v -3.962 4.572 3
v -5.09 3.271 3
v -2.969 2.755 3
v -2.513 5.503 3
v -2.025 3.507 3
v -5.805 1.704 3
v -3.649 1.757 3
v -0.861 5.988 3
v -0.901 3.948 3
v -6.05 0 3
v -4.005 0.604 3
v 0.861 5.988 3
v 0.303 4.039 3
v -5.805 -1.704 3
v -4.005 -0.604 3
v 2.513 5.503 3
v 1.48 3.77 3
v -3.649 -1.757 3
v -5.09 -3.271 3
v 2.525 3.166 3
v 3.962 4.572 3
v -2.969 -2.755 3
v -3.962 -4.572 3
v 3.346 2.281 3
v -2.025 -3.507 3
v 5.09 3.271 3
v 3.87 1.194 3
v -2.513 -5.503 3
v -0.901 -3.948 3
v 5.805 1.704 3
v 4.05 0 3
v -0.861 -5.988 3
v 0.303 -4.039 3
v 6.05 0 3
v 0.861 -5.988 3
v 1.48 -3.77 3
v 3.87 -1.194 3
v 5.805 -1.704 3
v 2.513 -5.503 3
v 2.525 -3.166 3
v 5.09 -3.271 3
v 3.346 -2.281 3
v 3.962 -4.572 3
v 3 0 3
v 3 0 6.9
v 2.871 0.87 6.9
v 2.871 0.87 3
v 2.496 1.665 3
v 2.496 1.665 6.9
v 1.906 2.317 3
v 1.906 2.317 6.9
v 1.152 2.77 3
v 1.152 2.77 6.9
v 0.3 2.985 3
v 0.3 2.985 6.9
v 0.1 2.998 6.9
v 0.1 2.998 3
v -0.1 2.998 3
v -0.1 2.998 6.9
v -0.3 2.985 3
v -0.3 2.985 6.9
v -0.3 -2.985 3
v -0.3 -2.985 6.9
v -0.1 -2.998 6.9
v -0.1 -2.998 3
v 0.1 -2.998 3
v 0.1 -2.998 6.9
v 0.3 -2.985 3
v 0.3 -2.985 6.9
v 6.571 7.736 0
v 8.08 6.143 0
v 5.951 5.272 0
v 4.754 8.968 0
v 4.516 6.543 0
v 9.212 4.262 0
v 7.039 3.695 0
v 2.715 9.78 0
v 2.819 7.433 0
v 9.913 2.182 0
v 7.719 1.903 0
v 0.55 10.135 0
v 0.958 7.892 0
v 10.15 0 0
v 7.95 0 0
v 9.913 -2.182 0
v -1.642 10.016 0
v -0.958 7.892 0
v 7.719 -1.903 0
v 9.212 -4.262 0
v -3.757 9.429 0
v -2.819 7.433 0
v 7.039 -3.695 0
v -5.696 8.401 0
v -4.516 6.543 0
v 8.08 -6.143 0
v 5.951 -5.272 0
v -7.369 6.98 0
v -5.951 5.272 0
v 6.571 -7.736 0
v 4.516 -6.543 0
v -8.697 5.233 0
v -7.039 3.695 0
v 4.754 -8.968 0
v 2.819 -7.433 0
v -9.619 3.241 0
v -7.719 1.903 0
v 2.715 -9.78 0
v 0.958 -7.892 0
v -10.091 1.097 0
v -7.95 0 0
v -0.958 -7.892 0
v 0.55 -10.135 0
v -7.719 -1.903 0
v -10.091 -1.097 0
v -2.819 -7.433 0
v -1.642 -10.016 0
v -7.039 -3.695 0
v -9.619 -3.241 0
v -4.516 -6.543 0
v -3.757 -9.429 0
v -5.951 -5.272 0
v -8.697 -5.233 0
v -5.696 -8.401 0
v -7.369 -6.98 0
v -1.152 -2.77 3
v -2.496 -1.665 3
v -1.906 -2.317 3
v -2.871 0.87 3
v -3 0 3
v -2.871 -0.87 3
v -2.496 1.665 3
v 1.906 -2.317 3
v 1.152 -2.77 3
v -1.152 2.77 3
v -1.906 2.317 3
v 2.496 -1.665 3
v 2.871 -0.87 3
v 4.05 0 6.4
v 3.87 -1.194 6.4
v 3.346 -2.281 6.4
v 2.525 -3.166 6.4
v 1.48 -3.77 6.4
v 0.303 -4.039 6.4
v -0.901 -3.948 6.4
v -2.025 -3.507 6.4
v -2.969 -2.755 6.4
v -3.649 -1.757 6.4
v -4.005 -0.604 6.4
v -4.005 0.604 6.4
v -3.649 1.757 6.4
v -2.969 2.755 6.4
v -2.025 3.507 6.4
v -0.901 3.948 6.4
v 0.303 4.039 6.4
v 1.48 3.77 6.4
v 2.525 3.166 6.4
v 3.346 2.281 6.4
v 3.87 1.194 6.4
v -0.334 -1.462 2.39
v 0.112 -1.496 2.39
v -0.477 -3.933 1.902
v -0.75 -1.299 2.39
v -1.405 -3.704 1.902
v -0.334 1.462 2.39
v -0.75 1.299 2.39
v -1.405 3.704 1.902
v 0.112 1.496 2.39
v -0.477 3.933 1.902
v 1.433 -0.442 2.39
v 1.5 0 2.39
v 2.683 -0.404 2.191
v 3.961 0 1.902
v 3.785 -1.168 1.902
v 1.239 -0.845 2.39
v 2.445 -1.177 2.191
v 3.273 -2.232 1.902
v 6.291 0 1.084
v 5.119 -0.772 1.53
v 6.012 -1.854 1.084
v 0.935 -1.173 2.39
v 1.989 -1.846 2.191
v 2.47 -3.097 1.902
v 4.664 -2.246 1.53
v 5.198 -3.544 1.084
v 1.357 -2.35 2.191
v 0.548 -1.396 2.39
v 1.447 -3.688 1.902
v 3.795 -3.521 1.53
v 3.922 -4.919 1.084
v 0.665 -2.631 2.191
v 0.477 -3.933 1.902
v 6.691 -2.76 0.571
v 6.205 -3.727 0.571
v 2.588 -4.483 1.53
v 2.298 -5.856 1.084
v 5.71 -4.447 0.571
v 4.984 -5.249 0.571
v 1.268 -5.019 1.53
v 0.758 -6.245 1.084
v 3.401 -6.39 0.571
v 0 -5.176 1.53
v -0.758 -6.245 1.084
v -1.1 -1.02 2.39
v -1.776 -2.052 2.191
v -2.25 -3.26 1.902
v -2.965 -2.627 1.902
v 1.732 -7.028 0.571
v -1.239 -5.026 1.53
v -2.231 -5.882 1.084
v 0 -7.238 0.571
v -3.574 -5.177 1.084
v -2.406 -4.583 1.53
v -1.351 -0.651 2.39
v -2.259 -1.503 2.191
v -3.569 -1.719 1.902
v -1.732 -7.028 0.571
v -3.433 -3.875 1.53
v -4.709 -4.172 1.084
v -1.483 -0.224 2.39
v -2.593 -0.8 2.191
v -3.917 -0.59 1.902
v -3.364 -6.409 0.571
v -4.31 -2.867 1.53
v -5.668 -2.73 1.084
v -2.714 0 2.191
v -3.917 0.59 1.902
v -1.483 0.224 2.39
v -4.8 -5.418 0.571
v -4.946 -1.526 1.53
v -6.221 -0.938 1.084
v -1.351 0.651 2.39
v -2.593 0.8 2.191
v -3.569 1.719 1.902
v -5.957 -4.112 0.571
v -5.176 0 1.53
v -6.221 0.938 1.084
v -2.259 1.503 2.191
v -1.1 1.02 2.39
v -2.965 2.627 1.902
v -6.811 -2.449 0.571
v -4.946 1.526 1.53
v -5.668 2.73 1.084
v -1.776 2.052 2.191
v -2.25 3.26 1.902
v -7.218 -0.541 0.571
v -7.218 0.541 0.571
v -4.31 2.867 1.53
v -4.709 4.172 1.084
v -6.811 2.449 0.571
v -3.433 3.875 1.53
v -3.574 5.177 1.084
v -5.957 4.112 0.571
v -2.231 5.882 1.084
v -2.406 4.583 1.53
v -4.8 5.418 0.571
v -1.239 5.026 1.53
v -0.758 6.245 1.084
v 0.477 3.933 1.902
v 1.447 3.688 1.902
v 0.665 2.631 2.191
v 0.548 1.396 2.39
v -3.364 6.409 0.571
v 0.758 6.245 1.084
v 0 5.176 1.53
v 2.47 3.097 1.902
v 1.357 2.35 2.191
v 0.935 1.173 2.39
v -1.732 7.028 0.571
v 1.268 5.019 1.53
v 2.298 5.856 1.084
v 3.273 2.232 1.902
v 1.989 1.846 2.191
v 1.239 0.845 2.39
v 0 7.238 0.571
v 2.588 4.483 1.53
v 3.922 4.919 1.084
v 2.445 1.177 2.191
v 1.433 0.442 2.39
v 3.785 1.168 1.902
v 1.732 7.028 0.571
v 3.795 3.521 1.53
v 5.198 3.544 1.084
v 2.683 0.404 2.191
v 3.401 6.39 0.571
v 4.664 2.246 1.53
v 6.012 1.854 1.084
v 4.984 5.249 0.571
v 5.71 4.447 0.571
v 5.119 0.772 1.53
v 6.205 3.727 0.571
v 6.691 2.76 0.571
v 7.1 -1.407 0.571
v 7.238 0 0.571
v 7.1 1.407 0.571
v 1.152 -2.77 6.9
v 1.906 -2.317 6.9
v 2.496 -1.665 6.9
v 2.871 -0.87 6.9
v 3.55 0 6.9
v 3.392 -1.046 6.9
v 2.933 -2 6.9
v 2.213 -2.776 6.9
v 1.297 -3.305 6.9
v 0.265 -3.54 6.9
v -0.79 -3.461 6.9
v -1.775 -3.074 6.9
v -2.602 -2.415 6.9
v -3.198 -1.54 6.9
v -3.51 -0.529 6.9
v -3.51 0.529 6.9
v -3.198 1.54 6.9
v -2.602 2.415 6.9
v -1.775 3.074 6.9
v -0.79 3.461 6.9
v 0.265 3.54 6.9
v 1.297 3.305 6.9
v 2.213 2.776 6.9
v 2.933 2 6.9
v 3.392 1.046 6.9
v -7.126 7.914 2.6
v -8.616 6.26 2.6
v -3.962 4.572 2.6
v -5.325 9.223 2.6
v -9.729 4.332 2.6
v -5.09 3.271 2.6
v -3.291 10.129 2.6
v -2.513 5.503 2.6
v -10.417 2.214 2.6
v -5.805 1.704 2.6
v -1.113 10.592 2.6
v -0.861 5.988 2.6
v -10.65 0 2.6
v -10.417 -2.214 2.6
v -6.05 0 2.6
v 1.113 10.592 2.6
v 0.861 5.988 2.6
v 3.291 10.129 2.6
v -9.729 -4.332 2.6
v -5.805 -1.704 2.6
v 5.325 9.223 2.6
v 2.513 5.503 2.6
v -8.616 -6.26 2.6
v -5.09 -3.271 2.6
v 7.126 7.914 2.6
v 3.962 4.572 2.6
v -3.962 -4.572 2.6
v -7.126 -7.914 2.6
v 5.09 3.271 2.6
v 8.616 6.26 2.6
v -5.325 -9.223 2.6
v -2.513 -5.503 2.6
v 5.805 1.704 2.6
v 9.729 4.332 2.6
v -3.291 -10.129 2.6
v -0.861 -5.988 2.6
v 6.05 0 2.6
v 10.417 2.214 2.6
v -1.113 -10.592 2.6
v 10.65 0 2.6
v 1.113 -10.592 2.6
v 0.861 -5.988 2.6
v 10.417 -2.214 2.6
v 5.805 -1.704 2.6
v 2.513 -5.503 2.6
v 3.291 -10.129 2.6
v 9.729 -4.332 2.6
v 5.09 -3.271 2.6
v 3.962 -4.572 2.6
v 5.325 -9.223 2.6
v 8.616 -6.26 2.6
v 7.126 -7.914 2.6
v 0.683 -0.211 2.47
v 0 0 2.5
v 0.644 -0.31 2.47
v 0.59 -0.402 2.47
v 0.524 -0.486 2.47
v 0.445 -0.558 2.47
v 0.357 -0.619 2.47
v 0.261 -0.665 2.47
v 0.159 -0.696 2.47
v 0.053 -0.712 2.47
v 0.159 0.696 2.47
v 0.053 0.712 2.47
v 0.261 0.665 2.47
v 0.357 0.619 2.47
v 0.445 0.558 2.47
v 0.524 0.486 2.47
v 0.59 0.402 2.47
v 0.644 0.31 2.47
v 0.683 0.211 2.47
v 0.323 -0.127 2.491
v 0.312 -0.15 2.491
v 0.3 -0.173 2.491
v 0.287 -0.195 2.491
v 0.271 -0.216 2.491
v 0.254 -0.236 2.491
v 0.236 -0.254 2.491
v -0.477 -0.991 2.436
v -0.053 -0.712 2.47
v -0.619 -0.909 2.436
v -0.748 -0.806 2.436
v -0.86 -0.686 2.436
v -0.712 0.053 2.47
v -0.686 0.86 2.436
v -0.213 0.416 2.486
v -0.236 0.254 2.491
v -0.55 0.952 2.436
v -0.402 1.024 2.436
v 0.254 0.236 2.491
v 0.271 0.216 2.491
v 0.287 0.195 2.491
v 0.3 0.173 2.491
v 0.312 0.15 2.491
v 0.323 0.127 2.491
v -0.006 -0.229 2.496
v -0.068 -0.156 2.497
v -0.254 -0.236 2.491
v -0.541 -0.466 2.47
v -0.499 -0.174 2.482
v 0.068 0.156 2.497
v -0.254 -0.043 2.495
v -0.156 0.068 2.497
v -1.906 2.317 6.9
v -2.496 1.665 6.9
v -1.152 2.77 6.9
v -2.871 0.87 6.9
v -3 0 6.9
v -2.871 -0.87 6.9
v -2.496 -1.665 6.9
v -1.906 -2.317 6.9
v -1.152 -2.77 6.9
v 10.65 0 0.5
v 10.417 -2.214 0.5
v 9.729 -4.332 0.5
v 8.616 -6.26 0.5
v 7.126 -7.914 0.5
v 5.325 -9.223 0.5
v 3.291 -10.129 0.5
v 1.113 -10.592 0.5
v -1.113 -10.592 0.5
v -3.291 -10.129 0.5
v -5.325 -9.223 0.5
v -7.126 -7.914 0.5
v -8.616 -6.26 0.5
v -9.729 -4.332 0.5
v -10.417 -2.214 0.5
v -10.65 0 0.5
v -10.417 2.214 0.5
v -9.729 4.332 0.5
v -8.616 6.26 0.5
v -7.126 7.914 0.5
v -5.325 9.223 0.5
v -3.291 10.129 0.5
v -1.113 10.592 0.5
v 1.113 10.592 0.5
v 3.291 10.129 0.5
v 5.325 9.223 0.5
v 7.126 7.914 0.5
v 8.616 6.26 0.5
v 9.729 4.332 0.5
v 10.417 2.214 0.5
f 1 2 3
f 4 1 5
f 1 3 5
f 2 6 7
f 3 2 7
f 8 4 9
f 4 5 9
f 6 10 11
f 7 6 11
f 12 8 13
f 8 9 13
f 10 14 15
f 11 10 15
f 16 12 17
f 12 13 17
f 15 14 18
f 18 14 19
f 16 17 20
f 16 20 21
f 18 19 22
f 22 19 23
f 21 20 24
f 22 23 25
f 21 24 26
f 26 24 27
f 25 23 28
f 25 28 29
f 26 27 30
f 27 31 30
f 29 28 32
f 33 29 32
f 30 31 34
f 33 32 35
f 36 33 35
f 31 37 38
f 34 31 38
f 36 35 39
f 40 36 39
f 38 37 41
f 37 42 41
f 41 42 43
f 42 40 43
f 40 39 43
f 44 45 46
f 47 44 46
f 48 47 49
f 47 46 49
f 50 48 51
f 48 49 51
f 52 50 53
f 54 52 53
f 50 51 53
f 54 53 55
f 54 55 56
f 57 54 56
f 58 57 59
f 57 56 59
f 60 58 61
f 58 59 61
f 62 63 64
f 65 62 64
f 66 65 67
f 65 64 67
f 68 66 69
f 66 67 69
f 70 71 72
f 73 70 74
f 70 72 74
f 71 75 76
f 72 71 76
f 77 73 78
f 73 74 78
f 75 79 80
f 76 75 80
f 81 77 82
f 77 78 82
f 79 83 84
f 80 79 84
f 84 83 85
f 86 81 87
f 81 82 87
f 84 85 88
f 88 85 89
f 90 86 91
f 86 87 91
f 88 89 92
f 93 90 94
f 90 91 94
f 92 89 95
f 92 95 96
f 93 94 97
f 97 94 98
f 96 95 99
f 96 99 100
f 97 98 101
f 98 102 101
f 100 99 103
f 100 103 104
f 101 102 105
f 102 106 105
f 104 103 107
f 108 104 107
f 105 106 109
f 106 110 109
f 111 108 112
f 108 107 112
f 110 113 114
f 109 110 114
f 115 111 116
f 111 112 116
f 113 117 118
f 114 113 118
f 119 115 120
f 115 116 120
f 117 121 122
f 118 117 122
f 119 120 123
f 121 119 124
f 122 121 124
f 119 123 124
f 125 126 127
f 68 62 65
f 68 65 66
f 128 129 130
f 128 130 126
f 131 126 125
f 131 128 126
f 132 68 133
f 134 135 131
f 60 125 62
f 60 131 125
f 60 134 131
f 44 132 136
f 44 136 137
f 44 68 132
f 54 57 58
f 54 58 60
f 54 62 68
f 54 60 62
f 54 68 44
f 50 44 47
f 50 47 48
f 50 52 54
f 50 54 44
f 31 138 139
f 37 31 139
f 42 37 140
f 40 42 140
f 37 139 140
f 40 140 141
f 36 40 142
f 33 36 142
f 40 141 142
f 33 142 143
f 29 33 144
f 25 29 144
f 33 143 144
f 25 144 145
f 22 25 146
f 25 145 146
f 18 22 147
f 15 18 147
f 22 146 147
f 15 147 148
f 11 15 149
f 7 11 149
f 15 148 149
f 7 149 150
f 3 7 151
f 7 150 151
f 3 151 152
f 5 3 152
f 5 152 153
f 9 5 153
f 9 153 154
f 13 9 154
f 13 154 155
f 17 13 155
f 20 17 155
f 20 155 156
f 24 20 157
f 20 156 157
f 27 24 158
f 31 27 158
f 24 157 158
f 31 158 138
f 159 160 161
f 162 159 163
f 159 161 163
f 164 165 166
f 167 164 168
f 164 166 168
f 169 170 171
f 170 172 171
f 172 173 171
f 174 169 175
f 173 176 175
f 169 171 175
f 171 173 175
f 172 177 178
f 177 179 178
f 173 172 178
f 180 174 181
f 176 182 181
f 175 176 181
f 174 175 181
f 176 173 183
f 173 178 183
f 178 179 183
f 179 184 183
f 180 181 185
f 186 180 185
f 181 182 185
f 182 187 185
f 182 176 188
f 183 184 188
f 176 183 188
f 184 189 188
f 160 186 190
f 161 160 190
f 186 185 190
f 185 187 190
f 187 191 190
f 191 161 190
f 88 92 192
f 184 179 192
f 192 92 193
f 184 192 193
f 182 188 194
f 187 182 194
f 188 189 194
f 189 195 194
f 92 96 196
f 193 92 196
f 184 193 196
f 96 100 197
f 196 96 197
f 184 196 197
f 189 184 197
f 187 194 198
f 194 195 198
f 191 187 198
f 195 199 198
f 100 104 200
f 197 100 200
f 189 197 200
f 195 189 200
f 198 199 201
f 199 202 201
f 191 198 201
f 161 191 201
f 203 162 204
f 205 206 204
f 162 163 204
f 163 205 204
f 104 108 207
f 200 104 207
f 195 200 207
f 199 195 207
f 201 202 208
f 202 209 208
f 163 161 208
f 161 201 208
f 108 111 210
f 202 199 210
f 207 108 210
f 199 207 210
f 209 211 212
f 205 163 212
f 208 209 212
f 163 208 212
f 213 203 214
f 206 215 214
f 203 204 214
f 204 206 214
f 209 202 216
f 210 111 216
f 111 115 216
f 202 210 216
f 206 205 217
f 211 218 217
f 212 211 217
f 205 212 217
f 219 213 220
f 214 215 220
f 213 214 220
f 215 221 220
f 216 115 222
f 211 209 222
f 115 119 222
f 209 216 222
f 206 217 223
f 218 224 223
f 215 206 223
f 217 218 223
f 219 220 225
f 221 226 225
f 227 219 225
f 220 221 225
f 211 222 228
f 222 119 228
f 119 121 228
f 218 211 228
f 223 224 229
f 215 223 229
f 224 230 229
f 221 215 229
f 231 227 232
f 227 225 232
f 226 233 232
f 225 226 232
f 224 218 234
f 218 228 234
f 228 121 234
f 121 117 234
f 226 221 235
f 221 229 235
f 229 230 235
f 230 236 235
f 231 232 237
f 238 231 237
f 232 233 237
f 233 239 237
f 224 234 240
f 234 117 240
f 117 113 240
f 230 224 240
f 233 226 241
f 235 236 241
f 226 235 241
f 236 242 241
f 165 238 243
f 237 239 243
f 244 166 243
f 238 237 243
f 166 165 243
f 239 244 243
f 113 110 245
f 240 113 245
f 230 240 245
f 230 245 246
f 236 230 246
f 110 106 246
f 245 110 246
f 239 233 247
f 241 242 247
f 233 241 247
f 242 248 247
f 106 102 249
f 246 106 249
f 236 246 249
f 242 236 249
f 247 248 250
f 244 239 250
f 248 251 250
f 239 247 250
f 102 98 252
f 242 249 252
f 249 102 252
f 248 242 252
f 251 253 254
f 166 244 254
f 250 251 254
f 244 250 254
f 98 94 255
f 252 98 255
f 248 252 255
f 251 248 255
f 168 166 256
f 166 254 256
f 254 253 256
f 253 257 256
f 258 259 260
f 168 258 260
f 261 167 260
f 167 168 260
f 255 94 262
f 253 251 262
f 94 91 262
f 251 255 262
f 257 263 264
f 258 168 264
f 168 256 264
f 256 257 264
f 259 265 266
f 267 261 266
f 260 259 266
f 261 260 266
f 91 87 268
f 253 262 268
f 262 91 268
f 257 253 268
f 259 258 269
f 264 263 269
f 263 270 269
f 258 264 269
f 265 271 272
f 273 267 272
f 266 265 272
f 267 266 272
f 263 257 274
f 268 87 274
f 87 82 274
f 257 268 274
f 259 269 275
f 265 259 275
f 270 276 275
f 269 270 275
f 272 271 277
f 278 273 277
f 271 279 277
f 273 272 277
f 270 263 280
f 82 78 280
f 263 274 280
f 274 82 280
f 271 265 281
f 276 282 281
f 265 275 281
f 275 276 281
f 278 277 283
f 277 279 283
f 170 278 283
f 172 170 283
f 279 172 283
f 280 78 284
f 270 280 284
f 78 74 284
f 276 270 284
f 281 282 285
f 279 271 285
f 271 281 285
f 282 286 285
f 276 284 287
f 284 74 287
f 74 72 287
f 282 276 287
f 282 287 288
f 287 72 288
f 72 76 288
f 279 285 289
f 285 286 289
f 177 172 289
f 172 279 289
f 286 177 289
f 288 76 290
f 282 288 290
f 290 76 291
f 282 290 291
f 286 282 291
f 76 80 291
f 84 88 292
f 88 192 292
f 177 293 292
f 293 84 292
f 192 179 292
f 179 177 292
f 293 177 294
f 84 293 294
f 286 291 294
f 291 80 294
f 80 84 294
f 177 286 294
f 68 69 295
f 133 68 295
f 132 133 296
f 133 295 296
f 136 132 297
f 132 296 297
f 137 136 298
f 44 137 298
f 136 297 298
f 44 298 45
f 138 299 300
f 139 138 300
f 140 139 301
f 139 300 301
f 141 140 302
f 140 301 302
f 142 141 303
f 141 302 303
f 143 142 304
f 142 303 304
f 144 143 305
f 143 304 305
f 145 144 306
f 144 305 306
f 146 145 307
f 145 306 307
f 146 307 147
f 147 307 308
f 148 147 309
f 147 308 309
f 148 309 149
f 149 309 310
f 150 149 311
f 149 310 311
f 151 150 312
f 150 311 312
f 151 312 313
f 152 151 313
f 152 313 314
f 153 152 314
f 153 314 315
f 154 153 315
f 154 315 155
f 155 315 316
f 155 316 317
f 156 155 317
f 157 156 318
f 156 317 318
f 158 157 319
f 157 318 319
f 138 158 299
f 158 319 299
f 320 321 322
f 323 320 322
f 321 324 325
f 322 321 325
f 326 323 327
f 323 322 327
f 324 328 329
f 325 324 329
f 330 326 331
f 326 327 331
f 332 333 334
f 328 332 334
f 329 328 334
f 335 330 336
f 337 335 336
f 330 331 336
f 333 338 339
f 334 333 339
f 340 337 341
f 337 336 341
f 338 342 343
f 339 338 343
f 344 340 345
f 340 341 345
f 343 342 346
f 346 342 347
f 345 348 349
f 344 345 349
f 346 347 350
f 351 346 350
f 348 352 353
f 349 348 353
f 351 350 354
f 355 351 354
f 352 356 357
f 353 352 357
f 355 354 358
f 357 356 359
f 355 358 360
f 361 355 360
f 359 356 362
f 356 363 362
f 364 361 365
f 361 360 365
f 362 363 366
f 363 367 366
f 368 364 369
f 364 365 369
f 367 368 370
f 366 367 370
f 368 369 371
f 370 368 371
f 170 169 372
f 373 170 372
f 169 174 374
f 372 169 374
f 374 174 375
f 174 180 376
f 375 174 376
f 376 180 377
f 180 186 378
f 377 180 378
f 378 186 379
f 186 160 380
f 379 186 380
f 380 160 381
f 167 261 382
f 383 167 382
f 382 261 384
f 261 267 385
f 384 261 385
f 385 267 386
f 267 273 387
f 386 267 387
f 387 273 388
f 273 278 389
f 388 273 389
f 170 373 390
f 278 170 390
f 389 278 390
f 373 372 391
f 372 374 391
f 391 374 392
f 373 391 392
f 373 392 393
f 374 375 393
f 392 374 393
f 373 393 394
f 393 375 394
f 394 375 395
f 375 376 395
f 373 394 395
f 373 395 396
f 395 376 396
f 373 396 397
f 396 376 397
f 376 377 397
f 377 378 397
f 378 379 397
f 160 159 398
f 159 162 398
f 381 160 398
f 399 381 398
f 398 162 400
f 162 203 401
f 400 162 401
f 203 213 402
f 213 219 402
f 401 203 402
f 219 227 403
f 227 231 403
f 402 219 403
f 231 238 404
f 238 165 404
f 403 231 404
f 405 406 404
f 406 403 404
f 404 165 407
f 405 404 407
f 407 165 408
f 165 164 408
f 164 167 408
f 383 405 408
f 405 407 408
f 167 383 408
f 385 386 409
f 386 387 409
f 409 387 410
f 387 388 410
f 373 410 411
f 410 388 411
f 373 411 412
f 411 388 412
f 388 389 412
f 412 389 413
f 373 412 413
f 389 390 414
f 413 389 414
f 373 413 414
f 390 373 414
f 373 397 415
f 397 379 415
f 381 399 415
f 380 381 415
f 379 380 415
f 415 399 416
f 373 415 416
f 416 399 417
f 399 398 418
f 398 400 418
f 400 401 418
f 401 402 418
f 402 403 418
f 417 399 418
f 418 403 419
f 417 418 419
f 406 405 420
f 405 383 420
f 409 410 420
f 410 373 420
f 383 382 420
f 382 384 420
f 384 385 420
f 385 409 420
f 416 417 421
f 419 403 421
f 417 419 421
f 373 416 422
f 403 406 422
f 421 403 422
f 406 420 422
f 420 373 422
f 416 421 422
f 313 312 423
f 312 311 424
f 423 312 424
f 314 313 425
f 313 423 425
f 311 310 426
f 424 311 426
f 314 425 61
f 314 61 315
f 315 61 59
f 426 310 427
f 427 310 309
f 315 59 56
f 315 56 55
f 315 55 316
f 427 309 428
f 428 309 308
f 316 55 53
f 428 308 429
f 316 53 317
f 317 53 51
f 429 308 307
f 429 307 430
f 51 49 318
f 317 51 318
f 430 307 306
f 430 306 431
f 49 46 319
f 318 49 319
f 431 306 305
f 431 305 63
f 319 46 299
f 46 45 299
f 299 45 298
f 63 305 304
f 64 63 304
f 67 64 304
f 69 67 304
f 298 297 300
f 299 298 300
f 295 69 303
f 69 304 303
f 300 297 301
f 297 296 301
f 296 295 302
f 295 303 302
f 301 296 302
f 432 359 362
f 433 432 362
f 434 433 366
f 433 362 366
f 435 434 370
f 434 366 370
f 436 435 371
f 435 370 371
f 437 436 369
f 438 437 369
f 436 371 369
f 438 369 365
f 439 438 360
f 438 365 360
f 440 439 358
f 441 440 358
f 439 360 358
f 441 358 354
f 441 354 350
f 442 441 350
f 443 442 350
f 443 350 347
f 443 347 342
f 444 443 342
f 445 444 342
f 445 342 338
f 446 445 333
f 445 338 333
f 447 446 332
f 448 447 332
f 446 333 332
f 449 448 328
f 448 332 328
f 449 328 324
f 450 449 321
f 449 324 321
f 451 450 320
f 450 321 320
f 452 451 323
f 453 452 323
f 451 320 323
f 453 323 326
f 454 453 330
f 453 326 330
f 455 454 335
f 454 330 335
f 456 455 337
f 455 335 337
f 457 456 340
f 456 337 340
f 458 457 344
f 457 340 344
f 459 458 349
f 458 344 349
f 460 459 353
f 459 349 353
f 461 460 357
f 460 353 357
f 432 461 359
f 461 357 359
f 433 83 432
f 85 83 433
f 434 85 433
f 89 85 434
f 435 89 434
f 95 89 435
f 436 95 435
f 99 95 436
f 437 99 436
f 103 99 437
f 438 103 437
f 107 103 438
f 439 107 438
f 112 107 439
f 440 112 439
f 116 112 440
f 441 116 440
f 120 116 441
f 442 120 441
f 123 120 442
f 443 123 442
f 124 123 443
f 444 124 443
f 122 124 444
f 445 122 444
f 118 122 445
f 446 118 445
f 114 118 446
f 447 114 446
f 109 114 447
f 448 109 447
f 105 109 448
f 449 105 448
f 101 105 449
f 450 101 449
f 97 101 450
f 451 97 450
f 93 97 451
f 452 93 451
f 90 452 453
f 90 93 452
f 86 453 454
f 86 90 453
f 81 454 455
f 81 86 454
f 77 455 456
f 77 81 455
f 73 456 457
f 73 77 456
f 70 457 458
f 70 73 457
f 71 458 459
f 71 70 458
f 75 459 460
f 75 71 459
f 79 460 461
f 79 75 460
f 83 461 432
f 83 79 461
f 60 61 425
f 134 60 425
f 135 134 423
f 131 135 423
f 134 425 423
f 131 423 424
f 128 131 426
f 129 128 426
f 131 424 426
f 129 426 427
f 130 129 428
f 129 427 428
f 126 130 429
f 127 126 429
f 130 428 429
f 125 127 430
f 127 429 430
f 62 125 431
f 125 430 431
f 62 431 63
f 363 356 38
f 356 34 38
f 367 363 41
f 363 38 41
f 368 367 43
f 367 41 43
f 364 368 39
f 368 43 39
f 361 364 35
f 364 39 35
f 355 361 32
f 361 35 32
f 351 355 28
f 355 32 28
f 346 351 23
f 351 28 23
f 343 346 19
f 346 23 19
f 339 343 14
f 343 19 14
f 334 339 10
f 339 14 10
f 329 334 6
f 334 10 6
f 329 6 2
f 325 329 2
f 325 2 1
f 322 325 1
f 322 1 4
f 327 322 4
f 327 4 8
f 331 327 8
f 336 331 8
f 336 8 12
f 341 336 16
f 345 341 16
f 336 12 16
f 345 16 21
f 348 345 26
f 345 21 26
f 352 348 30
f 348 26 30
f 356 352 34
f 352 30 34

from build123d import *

# Parameters (mm, degrees)
F2_SIZE  = 0.5
F3_SIZE  = 0.5
F6_DEPTH = 3.9


with BuildPart() as f1:
    # F0 (on Front) → F1 (revolve)
    with BuildSketch(Plane.XZ):
        with BuildLine():
            add(Edge.make_bspline(
                [(1.5, 2.389568), (3.847685, 2.088384), (6.806025, 1.195458), (7.95, 0)],
                knots=[1.564524, 1.564524, 1.564524, 1.564524, 8.333817, 8.333817, 8.333817, 8.333817], degree=3))
            Line((7.95, 0), (10.65, 0))
            Line((10.65, 0), (10.65, 2.6))
            Line((10.65, 2.6), (6.05, 2.6))
            Line((6.05, 2.6), (6.05, 3))
            Line((6.05, 3), (4.05, 3))
            Line((4.05, 3), (4.05, 6.9))
            Line((4.05, 6.9), (0, 6.9))
            Line((0, 6.9), (0, 2.889568))
            Line((0, 2.889568), (1.5, 2.889568))
            Line((1.5, 2.889568), (1.5, 2.389568))
        make_face()
        with BuildLine():
            Line((0, 2.889568), (0, 2.5))
            add(Edge.make_bspline(
                [(0, 2.5), (0.447422, 2.497178), (0.957401, 2.459178), (1.5, 2.389568)],
                knots=[0, 0, 0, 0, 1.564524, 1.564524, 1.564524, 1.564524], degree=3))
            Line((1.5, 2.389568), (1.5, 2.889568))
            Line((1.5, 2.889568), (0, 2.889568))
        make_face()
    revolve(axis=Axis((0, 0, 3.45), (0, 0, -1)))

    # F2
    f2_edges = [f1.edges().sort_by_distance(p)[0] for p in [
        (-4.05, 0, 6.9),
    ]]
    chamfer(f2_edges, length=F2_SIZE)

    # F3
    f3_edges = [f1.edges().sort_by_distance(p)[0] for p in [
        (-10.65, 0, 0),
    ]]
    chamfer(f3_edges, length=F3_SIZE)

    # F5 (on offset) → F6 (cut)
    with BuildSketch(Plane.XY.offset(6.9)):
        with BuildLine():
            ThreePointArc((0.3, -2.984962), (2.22486, -2.012461), (3, 0))
            ThreePointArc((3, 0), (2.22486, 2.012461), (0.3, 2.984962))
            Line((0.3, 2.984962), (0.3, 0))
            Line((0.3, 0), (0.3, -2.984962))
        make_face()
        with BuildLine():
            Line((0.3, 0), (0.3, 2.984962))
            ThreePointArc((0.3, 2.984962), (0, 3), (-0.3, 2.984962))
            Line((-0.3, 2.984962), (-0.3, 0))
            Line((-0.3, 0), (0, 0))
            Line((0, 0), (0.3, 0))
        make_face()
        with BuildLine():
            ThreePointArc((-0.3, -2.984962), (0, -3), (0.3, -2.984962))
            Line((0.3, -2.984962), (0.3, 0))
            Line((0.3, 0), (0, 0))
            Line((0, 0), (-0.3, 0))
            Line((-0.3, 0), (-0.3, -2.984962))
        make_face()
        with BuildLine():
            Line((-0.3, 0), (-0.3, 2.984962))
            ThreePointArc((-0.3, 2.984962), (-3, 0), (-0.3, -2.984962))
            Line((-0.3, -2.984962), (-0.3, 0))
        make_face()
    extrude(amount=-F6_DEPTH, mode=Mode.SUBTRACT)


solid = f1.part
